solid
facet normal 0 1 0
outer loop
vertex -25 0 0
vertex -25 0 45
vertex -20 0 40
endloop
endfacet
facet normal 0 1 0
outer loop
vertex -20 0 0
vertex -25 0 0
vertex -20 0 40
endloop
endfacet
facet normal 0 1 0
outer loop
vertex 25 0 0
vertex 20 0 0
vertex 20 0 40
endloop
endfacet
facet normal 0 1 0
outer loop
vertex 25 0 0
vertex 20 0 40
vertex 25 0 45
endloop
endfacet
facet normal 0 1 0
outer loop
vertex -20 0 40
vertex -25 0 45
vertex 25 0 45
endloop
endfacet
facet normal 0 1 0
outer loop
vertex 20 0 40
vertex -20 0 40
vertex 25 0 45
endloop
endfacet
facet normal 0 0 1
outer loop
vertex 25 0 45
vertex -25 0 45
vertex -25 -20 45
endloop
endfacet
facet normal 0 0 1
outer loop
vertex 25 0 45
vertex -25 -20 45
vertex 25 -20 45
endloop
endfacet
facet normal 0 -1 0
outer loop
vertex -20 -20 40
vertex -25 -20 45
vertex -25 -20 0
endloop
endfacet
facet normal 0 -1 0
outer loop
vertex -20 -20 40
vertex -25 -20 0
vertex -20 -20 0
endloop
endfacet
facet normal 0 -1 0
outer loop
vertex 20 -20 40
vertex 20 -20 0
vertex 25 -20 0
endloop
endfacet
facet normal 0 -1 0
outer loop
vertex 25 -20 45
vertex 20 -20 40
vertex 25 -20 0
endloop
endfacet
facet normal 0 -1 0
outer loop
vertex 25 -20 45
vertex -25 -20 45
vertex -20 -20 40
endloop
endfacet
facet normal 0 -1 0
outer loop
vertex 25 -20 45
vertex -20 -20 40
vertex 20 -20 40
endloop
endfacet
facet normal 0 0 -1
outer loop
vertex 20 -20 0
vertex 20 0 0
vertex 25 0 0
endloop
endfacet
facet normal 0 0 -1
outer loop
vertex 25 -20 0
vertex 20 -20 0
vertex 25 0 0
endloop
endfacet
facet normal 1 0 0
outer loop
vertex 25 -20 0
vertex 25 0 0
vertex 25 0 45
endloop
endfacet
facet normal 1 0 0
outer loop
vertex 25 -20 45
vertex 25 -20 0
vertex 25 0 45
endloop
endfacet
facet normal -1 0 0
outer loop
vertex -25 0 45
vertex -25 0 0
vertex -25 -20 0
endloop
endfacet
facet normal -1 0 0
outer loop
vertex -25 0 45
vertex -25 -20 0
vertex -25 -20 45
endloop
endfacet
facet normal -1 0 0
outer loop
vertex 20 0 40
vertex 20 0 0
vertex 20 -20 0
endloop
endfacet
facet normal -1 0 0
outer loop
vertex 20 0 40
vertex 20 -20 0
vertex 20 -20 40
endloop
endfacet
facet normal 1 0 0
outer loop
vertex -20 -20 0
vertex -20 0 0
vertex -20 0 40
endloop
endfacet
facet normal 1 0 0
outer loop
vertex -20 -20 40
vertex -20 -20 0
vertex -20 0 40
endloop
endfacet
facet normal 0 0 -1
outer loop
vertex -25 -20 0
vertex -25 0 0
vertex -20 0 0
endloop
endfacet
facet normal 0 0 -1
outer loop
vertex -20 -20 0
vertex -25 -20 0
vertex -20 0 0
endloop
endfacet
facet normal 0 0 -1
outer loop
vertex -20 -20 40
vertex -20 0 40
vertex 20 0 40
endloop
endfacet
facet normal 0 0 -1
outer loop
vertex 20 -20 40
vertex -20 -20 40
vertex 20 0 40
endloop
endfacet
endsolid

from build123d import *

# Parameters (mm, degrees)
F0_W     = 50
F0_H     = 45
F1_DEPTH = 20
F2_W     = 40
F2_H     = 80
F3_DEPTH = 20


with BuildPart() as f1:
    # F0 (on Front) → F1 (new body)
    with BuildSketch(Plane.XZ):
        with Locations((0, 22.5)):
            Rectangle(F0_W, F0_H)
    extrude(amount=F1_DEPTH)

    # F2 (on Front) → F3 (cut)
    with BuildSketch(Plane.XZ):
        Rectangle(F2_W, F2_H)
    extrude(amount=F3_DEPTH, mode=Mode.SUBTRACT)


solid = f1.part
